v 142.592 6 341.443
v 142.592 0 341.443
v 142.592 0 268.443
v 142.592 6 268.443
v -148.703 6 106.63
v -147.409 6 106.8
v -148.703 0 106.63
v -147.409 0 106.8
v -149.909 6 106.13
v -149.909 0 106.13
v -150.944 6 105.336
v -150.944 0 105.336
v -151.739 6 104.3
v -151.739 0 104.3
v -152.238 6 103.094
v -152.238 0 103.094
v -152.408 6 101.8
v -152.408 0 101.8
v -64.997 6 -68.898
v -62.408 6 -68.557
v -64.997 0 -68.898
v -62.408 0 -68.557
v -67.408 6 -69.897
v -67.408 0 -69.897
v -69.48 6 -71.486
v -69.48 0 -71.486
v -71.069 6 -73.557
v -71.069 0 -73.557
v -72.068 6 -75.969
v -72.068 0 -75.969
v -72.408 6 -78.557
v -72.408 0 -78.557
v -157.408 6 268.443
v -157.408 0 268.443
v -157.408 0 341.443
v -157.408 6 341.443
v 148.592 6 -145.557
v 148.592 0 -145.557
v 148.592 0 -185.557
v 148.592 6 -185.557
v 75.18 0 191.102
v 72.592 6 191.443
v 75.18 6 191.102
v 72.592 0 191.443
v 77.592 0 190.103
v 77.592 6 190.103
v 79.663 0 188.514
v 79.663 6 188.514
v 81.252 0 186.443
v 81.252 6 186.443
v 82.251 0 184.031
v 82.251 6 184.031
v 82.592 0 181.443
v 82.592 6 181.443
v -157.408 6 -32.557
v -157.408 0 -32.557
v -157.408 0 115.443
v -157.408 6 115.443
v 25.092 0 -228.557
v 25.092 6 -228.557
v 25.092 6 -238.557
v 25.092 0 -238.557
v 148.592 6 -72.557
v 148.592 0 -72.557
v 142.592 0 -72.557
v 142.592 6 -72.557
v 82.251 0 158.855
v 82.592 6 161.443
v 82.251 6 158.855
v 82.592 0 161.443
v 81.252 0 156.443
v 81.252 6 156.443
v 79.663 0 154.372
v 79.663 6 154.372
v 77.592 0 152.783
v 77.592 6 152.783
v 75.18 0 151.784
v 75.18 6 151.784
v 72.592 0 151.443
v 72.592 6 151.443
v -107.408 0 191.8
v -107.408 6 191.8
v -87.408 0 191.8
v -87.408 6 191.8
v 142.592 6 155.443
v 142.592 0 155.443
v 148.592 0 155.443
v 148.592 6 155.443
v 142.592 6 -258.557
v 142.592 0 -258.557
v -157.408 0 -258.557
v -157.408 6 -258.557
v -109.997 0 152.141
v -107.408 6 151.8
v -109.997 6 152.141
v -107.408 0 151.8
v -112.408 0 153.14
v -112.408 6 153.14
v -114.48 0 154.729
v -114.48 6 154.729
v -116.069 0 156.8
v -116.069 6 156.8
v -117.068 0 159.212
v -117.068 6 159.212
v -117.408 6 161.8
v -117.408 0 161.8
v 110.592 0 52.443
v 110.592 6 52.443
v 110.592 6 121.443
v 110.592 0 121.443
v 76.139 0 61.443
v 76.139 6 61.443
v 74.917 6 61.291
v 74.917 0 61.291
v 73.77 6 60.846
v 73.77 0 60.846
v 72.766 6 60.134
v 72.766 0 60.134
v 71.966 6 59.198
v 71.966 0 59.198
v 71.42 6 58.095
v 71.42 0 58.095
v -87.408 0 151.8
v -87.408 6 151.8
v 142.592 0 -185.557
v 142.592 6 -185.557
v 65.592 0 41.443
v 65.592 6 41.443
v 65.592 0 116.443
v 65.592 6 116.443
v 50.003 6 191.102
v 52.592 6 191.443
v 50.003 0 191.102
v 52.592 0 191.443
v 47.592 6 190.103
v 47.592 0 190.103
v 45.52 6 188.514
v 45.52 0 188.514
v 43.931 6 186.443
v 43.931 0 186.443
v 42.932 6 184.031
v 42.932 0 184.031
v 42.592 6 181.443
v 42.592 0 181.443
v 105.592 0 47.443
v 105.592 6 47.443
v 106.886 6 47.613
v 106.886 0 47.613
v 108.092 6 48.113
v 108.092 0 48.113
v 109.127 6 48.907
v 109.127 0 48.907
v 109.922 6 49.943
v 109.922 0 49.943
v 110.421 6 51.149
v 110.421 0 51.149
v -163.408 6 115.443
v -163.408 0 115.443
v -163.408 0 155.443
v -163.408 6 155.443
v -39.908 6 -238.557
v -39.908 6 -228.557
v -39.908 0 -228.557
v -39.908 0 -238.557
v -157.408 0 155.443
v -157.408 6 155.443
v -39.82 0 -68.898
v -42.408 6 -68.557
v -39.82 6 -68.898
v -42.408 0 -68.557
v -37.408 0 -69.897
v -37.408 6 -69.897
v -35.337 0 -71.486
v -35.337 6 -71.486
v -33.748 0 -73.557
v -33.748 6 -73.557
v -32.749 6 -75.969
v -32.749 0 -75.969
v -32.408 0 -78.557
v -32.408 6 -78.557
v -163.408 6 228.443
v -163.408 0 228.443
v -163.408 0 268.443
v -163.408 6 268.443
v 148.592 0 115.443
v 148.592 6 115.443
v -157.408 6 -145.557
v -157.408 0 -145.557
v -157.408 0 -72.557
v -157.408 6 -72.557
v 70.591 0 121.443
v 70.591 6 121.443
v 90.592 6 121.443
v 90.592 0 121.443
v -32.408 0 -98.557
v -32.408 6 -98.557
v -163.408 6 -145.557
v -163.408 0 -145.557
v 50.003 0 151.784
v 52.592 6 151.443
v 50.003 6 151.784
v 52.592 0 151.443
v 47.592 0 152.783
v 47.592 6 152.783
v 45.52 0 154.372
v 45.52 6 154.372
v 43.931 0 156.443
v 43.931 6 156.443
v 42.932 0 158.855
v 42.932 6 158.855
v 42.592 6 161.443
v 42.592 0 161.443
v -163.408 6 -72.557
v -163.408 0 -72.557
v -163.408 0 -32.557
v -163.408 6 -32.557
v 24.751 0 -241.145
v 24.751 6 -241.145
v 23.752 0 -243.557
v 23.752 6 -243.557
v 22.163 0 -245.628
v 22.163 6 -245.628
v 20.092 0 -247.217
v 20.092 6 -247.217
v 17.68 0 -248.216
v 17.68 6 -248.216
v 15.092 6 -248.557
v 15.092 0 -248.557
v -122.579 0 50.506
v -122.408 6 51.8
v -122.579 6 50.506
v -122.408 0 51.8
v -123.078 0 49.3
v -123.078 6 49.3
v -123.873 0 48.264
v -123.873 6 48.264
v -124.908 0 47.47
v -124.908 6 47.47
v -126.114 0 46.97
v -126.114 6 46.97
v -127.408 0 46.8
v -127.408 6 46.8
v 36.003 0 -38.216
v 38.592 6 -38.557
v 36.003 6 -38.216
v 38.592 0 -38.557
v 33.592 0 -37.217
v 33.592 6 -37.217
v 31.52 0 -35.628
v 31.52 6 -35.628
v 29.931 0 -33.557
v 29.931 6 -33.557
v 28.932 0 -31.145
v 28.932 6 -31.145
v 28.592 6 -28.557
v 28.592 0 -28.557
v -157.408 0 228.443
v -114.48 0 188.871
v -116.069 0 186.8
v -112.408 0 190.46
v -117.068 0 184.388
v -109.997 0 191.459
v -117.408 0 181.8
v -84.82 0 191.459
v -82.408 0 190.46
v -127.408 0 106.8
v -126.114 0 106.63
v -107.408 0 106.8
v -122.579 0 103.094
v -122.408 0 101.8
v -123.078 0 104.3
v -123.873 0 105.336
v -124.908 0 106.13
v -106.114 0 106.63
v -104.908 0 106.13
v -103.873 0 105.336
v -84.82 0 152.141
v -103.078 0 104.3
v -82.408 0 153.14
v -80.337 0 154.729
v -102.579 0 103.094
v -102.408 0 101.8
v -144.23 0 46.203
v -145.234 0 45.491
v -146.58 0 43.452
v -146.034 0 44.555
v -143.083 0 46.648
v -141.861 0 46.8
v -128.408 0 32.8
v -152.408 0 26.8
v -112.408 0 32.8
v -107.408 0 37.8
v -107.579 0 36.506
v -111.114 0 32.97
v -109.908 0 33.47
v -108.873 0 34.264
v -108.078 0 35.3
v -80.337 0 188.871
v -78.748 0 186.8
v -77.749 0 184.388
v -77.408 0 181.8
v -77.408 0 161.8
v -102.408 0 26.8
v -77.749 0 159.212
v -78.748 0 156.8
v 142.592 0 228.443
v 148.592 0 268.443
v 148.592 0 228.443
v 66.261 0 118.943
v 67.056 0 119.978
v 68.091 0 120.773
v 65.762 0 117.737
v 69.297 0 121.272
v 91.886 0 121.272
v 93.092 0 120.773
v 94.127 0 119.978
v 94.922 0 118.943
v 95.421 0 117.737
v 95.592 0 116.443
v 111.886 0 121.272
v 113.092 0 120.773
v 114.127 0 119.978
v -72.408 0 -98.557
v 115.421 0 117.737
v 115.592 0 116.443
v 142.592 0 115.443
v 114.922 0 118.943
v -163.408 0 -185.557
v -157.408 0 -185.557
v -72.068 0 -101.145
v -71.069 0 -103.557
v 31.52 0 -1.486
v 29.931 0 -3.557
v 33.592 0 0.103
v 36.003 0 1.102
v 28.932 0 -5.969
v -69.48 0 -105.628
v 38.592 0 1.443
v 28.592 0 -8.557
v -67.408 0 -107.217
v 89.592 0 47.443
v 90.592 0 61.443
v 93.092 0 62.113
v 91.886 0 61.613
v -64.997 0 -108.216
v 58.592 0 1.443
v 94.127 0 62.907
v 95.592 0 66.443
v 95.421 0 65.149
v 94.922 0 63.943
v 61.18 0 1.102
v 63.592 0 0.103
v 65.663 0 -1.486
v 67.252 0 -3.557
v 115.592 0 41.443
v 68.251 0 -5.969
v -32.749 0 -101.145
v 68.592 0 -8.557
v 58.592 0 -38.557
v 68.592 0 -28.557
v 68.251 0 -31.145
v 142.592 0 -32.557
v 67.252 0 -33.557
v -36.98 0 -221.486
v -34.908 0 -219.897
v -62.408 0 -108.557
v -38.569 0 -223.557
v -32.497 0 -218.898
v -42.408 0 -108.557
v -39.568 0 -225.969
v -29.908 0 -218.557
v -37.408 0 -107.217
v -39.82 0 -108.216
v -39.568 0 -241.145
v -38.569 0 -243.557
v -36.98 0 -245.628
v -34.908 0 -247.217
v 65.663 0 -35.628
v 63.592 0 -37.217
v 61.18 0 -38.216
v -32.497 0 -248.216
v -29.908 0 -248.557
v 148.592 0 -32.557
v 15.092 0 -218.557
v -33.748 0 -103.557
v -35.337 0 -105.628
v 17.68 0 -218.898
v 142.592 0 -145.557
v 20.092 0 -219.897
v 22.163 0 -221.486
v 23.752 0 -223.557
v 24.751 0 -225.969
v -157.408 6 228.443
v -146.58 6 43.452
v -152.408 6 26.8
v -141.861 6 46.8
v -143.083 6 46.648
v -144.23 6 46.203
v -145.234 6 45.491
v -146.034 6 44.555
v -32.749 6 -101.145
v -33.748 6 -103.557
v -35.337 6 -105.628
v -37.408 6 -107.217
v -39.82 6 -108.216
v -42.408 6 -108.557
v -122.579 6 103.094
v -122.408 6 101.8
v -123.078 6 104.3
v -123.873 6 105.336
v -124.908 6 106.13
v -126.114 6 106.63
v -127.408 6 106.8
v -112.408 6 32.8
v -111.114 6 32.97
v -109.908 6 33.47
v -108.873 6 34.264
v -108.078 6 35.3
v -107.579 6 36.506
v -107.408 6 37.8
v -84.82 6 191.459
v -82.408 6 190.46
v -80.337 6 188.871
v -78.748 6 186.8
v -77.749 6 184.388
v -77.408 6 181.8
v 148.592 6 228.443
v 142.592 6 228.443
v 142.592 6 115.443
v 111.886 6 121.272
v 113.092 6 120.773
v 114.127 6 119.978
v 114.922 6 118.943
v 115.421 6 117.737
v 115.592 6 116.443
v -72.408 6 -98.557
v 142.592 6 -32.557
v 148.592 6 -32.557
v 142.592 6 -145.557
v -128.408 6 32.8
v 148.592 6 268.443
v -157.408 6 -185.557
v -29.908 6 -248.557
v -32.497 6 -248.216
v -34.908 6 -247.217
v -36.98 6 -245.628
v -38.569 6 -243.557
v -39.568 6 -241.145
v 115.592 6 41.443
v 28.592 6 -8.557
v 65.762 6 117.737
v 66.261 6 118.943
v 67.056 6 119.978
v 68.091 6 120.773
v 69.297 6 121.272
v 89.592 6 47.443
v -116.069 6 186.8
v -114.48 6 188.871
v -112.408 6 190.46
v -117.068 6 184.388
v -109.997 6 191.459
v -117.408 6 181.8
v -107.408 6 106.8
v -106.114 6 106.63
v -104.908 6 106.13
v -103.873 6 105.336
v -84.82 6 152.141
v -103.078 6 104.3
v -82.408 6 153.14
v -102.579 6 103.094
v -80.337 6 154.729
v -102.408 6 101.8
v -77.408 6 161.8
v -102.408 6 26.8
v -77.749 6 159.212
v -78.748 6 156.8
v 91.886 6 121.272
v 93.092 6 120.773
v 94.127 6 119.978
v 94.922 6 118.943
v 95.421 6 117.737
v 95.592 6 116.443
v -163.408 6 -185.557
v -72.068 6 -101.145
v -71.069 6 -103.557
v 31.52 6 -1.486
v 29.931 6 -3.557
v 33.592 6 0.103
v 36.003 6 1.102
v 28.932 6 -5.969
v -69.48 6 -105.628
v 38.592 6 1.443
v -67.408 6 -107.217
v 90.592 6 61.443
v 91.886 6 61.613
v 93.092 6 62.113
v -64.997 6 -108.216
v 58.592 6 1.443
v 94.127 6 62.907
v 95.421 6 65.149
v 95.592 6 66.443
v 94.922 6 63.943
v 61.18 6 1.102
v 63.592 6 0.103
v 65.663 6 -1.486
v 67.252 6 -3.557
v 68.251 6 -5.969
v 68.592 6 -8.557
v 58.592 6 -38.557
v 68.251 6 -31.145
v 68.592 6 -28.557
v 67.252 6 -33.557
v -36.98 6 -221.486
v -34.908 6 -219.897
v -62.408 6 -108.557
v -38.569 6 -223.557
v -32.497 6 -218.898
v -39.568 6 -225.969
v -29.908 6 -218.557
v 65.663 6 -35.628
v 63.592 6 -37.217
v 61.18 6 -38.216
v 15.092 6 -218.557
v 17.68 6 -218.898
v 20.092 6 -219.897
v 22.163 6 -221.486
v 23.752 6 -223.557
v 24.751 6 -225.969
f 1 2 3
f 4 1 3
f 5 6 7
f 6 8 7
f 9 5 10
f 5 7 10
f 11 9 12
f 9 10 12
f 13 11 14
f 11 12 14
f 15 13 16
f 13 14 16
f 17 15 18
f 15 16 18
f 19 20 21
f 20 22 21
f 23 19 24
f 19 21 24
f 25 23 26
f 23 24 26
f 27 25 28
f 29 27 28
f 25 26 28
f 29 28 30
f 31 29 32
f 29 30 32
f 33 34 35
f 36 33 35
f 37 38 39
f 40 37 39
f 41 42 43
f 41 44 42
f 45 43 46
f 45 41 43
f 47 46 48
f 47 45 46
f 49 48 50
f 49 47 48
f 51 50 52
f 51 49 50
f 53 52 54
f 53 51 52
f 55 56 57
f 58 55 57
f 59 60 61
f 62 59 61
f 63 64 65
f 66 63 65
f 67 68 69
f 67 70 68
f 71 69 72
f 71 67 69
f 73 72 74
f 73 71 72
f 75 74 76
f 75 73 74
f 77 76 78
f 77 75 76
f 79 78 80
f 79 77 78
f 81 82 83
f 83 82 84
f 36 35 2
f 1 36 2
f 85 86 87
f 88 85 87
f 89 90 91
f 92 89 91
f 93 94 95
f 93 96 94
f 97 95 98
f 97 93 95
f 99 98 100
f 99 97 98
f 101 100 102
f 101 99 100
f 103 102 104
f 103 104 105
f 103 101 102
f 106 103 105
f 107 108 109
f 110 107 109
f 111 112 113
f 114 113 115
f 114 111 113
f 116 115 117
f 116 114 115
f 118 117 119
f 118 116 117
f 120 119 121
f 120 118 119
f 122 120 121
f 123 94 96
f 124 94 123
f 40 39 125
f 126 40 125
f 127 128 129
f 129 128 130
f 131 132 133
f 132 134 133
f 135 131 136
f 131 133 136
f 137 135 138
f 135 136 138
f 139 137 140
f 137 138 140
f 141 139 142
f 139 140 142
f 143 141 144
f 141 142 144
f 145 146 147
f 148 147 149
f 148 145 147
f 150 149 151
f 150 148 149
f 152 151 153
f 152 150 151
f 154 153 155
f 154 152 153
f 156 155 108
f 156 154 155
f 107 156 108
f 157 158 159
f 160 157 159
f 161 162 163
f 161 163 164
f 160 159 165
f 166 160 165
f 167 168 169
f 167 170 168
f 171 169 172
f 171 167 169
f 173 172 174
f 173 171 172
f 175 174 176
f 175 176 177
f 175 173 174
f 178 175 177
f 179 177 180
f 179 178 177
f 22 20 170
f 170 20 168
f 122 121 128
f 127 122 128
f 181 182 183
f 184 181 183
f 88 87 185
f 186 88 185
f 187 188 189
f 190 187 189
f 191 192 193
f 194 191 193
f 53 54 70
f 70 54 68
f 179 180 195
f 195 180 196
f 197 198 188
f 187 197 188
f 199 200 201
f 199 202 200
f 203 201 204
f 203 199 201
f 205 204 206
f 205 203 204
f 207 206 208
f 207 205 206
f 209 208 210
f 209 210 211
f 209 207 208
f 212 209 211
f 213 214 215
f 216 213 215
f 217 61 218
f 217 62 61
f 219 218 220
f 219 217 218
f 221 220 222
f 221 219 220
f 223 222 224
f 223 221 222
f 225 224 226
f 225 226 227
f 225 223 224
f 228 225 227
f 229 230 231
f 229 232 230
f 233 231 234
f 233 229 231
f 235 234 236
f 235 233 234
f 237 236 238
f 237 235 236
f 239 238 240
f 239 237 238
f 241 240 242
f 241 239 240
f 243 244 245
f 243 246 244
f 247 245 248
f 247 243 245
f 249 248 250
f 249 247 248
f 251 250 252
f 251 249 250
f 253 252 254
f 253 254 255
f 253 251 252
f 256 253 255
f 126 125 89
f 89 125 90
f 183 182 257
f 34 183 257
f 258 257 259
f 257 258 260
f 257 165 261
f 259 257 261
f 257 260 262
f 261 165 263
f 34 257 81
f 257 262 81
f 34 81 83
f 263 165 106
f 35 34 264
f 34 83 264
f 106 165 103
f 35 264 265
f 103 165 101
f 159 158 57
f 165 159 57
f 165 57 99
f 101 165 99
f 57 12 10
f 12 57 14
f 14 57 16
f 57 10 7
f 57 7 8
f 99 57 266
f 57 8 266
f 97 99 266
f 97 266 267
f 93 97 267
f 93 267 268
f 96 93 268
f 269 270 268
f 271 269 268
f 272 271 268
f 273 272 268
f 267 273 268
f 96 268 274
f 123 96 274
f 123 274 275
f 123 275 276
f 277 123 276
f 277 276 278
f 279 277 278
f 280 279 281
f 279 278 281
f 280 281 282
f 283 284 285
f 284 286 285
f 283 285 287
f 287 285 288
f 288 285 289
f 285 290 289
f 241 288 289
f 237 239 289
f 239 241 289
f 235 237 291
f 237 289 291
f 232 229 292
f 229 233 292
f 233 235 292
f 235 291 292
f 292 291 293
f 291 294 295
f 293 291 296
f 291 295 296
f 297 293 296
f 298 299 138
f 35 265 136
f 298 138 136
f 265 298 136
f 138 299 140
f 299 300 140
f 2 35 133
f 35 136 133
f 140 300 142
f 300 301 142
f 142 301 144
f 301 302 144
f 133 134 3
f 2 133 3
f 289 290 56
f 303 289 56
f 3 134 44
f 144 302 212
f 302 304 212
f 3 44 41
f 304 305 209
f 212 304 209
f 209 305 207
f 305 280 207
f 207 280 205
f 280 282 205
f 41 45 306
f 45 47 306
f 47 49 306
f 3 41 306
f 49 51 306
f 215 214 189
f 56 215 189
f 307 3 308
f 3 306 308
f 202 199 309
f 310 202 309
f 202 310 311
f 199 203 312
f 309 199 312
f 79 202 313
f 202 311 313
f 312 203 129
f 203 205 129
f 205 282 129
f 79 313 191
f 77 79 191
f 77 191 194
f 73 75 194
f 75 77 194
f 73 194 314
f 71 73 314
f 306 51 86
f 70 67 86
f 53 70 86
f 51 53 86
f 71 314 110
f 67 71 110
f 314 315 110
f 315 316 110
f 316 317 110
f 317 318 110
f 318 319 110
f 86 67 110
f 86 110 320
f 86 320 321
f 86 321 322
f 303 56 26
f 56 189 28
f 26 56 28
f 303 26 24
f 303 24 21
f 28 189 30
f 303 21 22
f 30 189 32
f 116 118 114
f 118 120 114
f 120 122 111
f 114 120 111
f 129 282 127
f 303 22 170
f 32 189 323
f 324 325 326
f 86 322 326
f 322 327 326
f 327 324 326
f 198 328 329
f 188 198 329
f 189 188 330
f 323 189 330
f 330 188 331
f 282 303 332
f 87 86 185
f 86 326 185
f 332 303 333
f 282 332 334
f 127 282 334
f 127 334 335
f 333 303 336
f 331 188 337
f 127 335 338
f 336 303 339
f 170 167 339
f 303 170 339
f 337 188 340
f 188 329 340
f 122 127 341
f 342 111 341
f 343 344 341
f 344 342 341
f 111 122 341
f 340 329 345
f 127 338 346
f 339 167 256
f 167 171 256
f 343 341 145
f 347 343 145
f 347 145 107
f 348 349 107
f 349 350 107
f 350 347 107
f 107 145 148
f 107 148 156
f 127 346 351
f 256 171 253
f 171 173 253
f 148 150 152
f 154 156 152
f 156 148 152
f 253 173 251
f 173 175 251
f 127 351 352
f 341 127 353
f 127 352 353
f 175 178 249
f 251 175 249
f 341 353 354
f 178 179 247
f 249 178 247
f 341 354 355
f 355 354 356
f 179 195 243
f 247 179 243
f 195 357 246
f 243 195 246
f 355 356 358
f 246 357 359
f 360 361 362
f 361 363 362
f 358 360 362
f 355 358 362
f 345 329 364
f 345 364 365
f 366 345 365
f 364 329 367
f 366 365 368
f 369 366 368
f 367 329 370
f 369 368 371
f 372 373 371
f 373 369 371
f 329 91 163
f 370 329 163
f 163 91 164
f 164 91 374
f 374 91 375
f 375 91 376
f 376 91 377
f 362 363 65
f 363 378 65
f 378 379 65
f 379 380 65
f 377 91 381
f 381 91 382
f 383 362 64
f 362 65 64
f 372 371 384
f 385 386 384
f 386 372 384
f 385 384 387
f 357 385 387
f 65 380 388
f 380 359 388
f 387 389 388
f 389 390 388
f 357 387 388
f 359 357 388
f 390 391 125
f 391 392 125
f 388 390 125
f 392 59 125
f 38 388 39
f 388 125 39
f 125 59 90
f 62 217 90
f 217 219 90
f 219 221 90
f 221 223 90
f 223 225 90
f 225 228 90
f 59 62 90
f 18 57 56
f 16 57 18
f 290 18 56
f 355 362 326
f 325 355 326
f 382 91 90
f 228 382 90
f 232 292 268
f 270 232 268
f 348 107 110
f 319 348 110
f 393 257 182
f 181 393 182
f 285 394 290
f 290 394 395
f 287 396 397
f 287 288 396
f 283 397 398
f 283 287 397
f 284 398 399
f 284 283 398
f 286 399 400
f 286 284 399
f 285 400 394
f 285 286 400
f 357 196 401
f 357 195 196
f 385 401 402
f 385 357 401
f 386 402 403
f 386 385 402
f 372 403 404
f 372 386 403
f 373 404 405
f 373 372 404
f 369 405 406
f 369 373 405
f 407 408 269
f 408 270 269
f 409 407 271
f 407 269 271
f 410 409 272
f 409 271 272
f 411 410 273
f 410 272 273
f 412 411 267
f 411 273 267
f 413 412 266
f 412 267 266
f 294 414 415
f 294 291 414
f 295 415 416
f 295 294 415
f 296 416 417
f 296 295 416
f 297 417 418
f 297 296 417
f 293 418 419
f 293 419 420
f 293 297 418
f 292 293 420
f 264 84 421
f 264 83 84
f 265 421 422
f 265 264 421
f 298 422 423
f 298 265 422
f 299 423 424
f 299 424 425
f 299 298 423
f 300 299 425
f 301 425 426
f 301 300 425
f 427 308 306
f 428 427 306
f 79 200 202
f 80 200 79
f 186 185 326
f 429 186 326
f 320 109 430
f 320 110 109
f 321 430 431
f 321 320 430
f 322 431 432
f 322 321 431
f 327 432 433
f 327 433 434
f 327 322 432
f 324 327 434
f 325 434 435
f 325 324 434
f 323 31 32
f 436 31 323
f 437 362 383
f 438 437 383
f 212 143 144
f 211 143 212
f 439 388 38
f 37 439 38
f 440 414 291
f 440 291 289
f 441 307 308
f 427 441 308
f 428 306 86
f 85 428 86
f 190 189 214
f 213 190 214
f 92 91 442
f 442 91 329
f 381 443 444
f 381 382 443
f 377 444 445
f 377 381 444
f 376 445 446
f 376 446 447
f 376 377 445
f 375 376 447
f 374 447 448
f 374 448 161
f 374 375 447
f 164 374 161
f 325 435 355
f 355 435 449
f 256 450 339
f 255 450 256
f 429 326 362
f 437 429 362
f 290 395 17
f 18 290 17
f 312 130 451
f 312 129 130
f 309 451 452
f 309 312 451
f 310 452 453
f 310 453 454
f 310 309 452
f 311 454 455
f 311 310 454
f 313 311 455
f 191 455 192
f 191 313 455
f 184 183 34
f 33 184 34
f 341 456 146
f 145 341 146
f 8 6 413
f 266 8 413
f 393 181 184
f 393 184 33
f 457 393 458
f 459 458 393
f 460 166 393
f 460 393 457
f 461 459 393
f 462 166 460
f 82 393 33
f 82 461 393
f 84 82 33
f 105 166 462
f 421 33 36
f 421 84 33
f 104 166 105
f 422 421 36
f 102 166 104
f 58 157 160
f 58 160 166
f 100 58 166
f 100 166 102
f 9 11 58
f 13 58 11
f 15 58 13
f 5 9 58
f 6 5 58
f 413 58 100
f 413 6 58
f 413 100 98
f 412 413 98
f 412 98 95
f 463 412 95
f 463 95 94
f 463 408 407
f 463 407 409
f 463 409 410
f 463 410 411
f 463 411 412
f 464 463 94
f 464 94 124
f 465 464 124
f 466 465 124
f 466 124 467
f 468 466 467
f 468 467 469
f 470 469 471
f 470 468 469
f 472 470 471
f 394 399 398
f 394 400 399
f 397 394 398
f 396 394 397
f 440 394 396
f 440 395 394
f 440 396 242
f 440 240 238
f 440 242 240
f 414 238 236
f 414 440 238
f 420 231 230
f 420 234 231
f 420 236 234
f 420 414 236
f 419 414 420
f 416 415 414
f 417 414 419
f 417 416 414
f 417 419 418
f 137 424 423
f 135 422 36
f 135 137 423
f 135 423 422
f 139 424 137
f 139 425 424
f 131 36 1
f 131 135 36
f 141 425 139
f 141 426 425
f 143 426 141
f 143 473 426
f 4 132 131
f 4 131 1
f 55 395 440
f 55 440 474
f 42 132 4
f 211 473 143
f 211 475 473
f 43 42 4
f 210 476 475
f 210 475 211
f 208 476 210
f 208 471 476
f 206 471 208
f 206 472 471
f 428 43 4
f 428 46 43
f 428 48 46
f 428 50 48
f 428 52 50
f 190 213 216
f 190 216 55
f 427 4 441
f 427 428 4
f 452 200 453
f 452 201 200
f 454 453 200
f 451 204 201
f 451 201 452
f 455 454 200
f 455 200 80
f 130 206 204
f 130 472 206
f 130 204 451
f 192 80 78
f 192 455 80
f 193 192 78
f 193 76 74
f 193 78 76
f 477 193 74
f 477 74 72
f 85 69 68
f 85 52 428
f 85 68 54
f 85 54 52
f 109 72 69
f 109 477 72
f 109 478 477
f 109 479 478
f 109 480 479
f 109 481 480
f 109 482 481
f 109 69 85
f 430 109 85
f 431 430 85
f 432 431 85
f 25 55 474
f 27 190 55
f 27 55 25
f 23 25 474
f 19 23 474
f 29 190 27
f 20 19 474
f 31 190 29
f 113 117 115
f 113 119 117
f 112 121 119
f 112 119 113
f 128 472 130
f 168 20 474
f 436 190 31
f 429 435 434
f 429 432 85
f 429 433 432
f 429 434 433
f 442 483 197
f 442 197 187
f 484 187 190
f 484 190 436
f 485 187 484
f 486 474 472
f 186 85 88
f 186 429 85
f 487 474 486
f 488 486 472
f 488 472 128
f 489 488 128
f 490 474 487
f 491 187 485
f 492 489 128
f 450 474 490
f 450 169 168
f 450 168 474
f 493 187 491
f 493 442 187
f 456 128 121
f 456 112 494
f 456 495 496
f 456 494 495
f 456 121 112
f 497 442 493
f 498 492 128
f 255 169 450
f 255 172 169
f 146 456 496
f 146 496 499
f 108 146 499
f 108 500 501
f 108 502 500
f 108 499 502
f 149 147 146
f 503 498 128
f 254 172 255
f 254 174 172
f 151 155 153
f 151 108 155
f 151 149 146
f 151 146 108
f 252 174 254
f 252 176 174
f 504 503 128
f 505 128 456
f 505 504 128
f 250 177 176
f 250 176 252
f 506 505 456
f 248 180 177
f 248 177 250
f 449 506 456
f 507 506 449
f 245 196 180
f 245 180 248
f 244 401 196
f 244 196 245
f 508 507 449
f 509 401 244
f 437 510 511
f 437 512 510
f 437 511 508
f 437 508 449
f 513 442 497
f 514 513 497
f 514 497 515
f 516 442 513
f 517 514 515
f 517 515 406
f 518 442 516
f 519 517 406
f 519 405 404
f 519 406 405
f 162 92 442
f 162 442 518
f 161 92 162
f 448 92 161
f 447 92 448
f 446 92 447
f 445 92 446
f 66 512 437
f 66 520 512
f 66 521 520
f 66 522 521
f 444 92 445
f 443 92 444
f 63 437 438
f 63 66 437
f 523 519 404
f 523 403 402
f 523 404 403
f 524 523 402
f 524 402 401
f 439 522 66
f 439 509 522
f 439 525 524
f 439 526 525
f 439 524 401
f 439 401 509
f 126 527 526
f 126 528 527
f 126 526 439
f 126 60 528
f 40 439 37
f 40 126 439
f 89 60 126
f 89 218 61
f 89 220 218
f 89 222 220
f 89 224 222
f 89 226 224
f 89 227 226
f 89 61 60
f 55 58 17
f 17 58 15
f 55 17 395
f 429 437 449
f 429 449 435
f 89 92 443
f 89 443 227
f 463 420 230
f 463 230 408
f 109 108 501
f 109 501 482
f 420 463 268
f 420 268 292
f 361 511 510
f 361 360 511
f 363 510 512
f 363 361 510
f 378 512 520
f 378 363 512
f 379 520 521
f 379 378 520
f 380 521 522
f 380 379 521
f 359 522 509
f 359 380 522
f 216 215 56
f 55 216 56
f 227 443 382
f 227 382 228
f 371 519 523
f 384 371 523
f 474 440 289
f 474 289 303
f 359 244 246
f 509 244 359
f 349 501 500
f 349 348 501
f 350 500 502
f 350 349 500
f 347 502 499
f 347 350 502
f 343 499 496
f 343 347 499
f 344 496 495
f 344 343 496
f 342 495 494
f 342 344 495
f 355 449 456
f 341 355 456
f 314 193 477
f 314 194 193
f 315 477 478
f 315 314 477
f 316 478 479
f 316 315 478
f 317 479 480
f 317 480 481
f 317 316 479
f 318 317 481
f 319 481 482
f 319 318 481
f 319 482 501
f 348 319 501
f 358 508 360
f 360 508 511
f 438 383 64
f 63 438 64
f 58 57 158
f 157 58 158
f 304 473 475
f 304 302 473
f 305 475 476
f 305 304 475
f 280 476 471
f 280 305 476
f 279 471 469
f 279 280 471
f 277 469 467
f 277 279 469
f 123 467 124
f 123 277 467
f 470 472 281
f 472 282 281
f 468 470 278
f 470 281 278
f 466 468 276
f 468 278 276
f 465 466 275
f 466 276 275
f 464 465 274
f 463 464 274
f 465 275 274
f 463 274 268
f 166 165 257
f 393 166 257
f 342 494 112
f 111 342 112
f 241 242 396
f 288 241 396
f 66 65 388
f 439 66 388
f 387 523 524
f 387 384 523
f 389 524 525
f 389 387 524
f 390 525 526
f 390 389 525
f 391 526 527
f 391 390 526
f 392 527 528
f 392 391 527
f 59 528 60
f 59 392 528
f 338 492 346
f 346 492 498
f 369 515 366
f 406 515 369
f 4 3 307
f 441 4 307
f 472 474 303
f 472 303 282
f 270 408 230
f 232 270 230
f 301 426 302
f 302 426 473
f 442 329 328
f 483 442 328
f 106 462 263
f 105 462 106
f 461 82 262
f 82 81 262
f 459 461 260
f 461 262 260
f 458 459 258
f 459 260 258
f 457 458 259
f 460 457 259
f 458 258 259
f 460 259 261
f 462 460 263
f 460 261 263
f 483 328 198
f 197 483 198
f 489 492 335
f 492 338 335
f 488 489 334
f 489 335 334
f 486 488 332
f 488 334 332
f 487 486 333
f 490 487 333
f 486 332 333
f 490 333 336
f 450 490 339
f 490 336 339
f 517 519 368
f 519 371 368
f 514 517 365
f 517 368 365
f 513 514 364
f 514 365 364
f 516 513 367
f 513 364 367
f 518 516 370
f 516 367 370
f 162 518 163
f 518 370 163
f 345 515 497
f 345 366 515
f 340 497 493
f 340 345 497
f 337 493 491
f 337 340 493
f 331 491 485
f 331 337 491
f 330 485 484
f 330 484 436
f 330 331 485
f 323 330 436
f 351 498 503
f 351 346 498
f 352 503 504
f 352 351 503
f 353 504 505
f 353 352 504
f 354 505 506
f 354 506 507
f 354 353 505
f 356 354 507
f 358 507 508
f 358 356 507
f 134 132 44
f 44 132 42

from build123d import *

# Parameters (mm, degrees)
BOSS_EXTRUDE1_DEPTH = 6
SKETCH2_W           = 40
SKETCH2_H           = 40
CUT_EXTRUDE1_DEPTH  = 10
FILLET1_R           = 10
CUT_EXTRUDE4_DEPTH  = 16
FILLET2_R           = 5
FILLET3_R           = 5
CUT_EXTRUDE5_DEPTH  = 16
FILLET4_R           = 5
SKETCH5_W           = 40
SKETCH5_H           = 40
CUT_EXTRUDE6_DEPTH  = 16
FILLET5_R           = 10
SKETCH6_W           = 65
SKETCH6_H           = 30
CUT_EXTRUDE7_DEPTH  = 16
FILLET6_R           = 10


with BuildPart() as part:
    # Sketch1 → Boss-Extrude1 (new body)
    with BuildSketch(Plane(origin=(0, 0, 0), x_dir=(1, 0, 0), z_dir=(0, 1, 0))):
        Polygon((-157.408498061, 145.557138299), (-157.408498061, 72.557138299), (-163.408498061, 72.557138299), (-163.408498061, 32.557138299), (-157.408498061, 32.557138299), (-157.408498061, -115.442861701), (-163.408498061, -115.442861701), (-163.408498061, -155.442861701), (-157.408498061, -155.442861701), (-157.408498061, -228.442861701), (-163.408498061, -228.442861701), (-163.408498061, -268.442861701), (-157.408498061, -268.442861701), (-157.408498061, -341.442861701), (142.591501939, -341.442861701), (142.591501939, -268.442861701), (148.591501939, -268.442861701), (148.591501939, -228.442861701), (142.591501939, -228.442861701), (142.591501939, -155.442861701), (148.591501939, -155.442861701), (148.591501939, -115.442861701), (142.591501939, -115.442861701), (142.591501939, 32.557138299), (148.591501939, 32.557138299), (148.591501939, 72.557138299), (142.591501939, 72.557138299), (142.591501939, 145.557138299), (148.591501939, 145.557138299), (148.591501939, 185.557138299), (142.591501939, 185.557138299), (142.591501939, 258.557138299), (-157.408498061, 258.557138299), (-157.408498061, 185.557138299), (-163.408498061, 185.557138299), (-163.408498061, 145.557138299), align=None)
    extrude(amount=BOSS_EXTRUDE1_DEPTH)

    # Sketch2 → Cut-Extrude1 (cut)
    with BuildSketch(Plane(origin=(0, 6, 0), x_dir=(1, 0, 0), z_dir=(0, 1, 0))):
        with Locations((-97.408498061, -171.800004558)):
            Rectangle(SKETCH2_W, SKETCH2_H)
        with Locations((62.591501939, -171.442861701)):
            Rectangle(SKETCH2_W, SKETCH2_H)
    extrude(amount=-CUT_EXTRUDE1_DEPTH, mode=Mode.SUBTRACT)

    # Fillet1
    fillet1_edges = [part.edges().sort_by_distance(p)[0] for p in [
        (-117.408498061, 3, 191.800004558),
        (-117.408498061, 3, 151.800004558),
        (-77.408498061, 3, 151.800004558),
        (-77.408498061, 3, 191.800004558),
        (42.591501939, 3, 191.442861701),
        (42.591501939, 3, 151.442861701),
        (82.591501939, 3, 151.442861701),
        (82.591501939, 3, 191.442861701),
    ]]
    fillet(fillet1_edges, radius=FILLET1_R)

    # Sketch3 → Cut-Extrude4 (cut)
    with BuildSketch(Plane(origin=(0, 6, 0), x_dir=(1, 0, 0), z_dir=(0, 1, 0))):
        Polygon((-102.408498061, -26.800004558), (-102.408498061, -106.800004558), (-107.408498061, -106.800004558), (-107.408498061, -32.800004558), (-128.408498061, -32.800004558), align=None)
        Polygon((-152.408498061, -106.800004558), (-122.408498061, -106.800004558), (-122.408498061, -46.800004558), (-145.408498061, -46.800004558), (-152.408498061, -26.800004558), align=None)
    extrude(amount=-CUT_EXTRUDE4_DEPTH, mode=Mode.SUBTRACT)

    # Fillet2
    fillet2_edges = [part.edges().sort_by_distance(p)[0] for p in [
        (-107.408498061, 3, 32.800004558),
        (-145.408498061, 3, 46.800004558),
        (-122.408498061, 3, 46.800004558),
    ]]
    fillet(fillet2_edges, radius=FILLET2_R)

    # Fillet3
    fillet3_edges = [part.edges().sort_by_distance(p)[0] for p in [
        (-102.408498061, 3, 106.800004558),
        (-152.408498061, 3, 106.800004558),
        (-122.408498061, 3, 106.800004558),
    ]]
    fillet(fillet3_edges, radius=FILLET3_R - 0.0001)  # a hair under: the kernel refuses the full size

    # Sketch4 → Cut-Extrude5 (cut)
    with BuildSketch(Plane(origin=(0, 6, 0), x_dir=(1, 0, 0), z_dir=(0, 1, 0))):
        Polygon((65.591501939, -41.442861701), (65.591501939, -121.442861701), (95.591501939, -121.442861701), (95.591501939, -61.442861701), (72.591501939, -61.442861701), align=None)
        Polygon((115.591501939, -41.442861701), (89.591501939, -47.442861701), (110.591501939, -47.442861701), (110.591501939, -121.442861701), (115.591501939, -121.442861701), align=None)
    extrude(amount=-CUT_EXTRUDE5_DEPTH, mode=Mode.SUBTRACT)

    # Fillet4
    fillet4_edges = [part.edges().sort_by_distance(p)[0] for p in [
        (115.591501939, 3, 121.442861701),
        (110.591501939, 3, 47.442861701),
        (72.591501939, 3, 61.442861701),
        (95.591501939, 3, 61.442861701),
        (95.591501939, 3, 121.442861701),
        (65.591501939, 3, 121.442861701),
    ]]
    fillet(fillet4_edges, radius=FILLET4_R - 0.0001)  # a hair under: the kernel refuses the full size

    # Sketch5 → Cut-Extrude6 (cut)
    with BuildSketch(Plane(origin=(0, 6, 0), x_dir=(1, 0, 0), z_dir=(0, 1, 0))):
        with Locations((-52.408498061, 88.557138299)):
            Rectangle(SKETCH5_W, SKETCH5_H)
        with Locations((48.591501939, 18.557138299)):
            Rectangle(SKETCH5_W, SKETCH5_H)
    extrude(amount=-CUT_EXTRUDE6_DEPTH, mode=Mode.SUBTRACT)

    # Fillet5
    fillet5_edges = [part.edges().sort_by_distance(p)[0] for p in [
        (-32.408498061, 3, -108.557138299),
        (-32.408498061, 3, -68.557138299),
        (-72.408498061, 3, -68.557138299),
        (-72.408498061, 3, -108.557138299),
        (28.591501939, 3, 1.442861701),
        (28.591501939, 3, -38.557138299),
        (68.591501939, 3, -38.557138299),
        (68.591501939, 3, 1.442861701),
    ]]
    fillet(fillet5_edges, radius=FILLET5_R)

    # Sketch6 → Cut-Extrude7 (cut)
    with BuildSketch(Plane(origin=(0, 6, 0), x_dir=(1, 0, 0), z_dir=(0, 1, 0))):
        with Locations((-7.408498061, 233.557138299)):
            Rectangle(SKETCH6_W, SKETCH6_H)
    extrude(amount=-CUT_EXTRUDE7_DEPTH, mode=Mode.SUBTRACT)

    # Fillet6
    fillet6_edges = [part.edges().sort_by_distance(p)[0] for p in [
        (25.091501939, 3, -248.557138299),
        (25.091501939, 3, -218.557138299),
        (-39.908498061, 3, -218.557138299),
        (-39.908498061, 3, -248.557138299),
    ]]
    fillet(fillet6_edges, radius=FILLET6_R)


solid = part.part
